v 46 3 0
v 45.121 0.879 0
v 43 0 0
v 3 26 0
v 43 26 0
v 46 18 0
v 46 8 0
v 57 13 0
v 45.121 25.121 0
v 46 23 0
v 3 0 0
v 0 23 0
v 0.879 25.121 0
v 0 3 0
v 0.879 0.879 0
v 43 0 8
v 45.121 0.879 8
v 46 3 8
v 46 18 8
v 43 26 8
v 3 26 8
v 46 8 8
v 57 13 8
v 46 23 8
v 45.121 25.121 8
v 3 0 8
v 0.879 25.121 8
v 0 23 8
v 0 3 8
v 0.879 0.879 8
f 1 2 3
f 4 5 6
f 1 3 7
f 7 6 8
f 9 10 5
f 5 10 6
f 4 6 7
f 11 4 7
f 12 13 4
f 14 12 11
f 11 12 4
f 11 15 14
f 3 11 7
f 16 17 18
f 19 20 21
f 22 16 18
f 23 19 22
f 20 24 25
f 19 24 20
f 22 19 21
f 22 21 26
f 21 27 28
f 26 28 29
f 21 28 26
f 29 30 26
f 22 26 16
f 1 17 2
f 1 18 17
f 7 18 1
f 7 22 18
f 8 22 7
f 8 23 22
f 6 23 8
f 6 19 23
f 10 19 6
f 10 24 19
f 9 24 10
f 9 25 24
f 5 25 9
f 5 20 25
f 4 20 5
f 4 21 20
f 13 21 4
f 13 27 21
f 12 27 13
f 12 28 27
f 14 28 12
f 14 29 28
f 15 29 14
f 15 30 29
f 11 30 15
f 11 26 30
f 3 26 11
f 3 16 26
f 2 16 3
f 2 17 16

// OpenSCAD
$fn = 32;

// ----------------------------------------------------------------------
// Ratchet pawl: 46 x 26 mm body, beak 11 mm с правого торца
// ----------------------------------------------------------------------

// --- parameters (mm) ---
profile_height = 8;       // extrusion height
profile_points = 15;      // points of the closed outline

profile = [[0, 3], [0.879, 0.879], [3, 0], [43, 0], [45.121, 0.879], [46, 3], [46, 8], [57, 13], [46, 18], [46, 23], [45.121, 25.121], [43, 26], [3, 26], [0.879, 25.121], [0, 23]];  // single closed polygon, 15 points, counter clockwise

// --- the one profile operation ---
linear_extrude(height = profile_height) polygon(points = profile);
